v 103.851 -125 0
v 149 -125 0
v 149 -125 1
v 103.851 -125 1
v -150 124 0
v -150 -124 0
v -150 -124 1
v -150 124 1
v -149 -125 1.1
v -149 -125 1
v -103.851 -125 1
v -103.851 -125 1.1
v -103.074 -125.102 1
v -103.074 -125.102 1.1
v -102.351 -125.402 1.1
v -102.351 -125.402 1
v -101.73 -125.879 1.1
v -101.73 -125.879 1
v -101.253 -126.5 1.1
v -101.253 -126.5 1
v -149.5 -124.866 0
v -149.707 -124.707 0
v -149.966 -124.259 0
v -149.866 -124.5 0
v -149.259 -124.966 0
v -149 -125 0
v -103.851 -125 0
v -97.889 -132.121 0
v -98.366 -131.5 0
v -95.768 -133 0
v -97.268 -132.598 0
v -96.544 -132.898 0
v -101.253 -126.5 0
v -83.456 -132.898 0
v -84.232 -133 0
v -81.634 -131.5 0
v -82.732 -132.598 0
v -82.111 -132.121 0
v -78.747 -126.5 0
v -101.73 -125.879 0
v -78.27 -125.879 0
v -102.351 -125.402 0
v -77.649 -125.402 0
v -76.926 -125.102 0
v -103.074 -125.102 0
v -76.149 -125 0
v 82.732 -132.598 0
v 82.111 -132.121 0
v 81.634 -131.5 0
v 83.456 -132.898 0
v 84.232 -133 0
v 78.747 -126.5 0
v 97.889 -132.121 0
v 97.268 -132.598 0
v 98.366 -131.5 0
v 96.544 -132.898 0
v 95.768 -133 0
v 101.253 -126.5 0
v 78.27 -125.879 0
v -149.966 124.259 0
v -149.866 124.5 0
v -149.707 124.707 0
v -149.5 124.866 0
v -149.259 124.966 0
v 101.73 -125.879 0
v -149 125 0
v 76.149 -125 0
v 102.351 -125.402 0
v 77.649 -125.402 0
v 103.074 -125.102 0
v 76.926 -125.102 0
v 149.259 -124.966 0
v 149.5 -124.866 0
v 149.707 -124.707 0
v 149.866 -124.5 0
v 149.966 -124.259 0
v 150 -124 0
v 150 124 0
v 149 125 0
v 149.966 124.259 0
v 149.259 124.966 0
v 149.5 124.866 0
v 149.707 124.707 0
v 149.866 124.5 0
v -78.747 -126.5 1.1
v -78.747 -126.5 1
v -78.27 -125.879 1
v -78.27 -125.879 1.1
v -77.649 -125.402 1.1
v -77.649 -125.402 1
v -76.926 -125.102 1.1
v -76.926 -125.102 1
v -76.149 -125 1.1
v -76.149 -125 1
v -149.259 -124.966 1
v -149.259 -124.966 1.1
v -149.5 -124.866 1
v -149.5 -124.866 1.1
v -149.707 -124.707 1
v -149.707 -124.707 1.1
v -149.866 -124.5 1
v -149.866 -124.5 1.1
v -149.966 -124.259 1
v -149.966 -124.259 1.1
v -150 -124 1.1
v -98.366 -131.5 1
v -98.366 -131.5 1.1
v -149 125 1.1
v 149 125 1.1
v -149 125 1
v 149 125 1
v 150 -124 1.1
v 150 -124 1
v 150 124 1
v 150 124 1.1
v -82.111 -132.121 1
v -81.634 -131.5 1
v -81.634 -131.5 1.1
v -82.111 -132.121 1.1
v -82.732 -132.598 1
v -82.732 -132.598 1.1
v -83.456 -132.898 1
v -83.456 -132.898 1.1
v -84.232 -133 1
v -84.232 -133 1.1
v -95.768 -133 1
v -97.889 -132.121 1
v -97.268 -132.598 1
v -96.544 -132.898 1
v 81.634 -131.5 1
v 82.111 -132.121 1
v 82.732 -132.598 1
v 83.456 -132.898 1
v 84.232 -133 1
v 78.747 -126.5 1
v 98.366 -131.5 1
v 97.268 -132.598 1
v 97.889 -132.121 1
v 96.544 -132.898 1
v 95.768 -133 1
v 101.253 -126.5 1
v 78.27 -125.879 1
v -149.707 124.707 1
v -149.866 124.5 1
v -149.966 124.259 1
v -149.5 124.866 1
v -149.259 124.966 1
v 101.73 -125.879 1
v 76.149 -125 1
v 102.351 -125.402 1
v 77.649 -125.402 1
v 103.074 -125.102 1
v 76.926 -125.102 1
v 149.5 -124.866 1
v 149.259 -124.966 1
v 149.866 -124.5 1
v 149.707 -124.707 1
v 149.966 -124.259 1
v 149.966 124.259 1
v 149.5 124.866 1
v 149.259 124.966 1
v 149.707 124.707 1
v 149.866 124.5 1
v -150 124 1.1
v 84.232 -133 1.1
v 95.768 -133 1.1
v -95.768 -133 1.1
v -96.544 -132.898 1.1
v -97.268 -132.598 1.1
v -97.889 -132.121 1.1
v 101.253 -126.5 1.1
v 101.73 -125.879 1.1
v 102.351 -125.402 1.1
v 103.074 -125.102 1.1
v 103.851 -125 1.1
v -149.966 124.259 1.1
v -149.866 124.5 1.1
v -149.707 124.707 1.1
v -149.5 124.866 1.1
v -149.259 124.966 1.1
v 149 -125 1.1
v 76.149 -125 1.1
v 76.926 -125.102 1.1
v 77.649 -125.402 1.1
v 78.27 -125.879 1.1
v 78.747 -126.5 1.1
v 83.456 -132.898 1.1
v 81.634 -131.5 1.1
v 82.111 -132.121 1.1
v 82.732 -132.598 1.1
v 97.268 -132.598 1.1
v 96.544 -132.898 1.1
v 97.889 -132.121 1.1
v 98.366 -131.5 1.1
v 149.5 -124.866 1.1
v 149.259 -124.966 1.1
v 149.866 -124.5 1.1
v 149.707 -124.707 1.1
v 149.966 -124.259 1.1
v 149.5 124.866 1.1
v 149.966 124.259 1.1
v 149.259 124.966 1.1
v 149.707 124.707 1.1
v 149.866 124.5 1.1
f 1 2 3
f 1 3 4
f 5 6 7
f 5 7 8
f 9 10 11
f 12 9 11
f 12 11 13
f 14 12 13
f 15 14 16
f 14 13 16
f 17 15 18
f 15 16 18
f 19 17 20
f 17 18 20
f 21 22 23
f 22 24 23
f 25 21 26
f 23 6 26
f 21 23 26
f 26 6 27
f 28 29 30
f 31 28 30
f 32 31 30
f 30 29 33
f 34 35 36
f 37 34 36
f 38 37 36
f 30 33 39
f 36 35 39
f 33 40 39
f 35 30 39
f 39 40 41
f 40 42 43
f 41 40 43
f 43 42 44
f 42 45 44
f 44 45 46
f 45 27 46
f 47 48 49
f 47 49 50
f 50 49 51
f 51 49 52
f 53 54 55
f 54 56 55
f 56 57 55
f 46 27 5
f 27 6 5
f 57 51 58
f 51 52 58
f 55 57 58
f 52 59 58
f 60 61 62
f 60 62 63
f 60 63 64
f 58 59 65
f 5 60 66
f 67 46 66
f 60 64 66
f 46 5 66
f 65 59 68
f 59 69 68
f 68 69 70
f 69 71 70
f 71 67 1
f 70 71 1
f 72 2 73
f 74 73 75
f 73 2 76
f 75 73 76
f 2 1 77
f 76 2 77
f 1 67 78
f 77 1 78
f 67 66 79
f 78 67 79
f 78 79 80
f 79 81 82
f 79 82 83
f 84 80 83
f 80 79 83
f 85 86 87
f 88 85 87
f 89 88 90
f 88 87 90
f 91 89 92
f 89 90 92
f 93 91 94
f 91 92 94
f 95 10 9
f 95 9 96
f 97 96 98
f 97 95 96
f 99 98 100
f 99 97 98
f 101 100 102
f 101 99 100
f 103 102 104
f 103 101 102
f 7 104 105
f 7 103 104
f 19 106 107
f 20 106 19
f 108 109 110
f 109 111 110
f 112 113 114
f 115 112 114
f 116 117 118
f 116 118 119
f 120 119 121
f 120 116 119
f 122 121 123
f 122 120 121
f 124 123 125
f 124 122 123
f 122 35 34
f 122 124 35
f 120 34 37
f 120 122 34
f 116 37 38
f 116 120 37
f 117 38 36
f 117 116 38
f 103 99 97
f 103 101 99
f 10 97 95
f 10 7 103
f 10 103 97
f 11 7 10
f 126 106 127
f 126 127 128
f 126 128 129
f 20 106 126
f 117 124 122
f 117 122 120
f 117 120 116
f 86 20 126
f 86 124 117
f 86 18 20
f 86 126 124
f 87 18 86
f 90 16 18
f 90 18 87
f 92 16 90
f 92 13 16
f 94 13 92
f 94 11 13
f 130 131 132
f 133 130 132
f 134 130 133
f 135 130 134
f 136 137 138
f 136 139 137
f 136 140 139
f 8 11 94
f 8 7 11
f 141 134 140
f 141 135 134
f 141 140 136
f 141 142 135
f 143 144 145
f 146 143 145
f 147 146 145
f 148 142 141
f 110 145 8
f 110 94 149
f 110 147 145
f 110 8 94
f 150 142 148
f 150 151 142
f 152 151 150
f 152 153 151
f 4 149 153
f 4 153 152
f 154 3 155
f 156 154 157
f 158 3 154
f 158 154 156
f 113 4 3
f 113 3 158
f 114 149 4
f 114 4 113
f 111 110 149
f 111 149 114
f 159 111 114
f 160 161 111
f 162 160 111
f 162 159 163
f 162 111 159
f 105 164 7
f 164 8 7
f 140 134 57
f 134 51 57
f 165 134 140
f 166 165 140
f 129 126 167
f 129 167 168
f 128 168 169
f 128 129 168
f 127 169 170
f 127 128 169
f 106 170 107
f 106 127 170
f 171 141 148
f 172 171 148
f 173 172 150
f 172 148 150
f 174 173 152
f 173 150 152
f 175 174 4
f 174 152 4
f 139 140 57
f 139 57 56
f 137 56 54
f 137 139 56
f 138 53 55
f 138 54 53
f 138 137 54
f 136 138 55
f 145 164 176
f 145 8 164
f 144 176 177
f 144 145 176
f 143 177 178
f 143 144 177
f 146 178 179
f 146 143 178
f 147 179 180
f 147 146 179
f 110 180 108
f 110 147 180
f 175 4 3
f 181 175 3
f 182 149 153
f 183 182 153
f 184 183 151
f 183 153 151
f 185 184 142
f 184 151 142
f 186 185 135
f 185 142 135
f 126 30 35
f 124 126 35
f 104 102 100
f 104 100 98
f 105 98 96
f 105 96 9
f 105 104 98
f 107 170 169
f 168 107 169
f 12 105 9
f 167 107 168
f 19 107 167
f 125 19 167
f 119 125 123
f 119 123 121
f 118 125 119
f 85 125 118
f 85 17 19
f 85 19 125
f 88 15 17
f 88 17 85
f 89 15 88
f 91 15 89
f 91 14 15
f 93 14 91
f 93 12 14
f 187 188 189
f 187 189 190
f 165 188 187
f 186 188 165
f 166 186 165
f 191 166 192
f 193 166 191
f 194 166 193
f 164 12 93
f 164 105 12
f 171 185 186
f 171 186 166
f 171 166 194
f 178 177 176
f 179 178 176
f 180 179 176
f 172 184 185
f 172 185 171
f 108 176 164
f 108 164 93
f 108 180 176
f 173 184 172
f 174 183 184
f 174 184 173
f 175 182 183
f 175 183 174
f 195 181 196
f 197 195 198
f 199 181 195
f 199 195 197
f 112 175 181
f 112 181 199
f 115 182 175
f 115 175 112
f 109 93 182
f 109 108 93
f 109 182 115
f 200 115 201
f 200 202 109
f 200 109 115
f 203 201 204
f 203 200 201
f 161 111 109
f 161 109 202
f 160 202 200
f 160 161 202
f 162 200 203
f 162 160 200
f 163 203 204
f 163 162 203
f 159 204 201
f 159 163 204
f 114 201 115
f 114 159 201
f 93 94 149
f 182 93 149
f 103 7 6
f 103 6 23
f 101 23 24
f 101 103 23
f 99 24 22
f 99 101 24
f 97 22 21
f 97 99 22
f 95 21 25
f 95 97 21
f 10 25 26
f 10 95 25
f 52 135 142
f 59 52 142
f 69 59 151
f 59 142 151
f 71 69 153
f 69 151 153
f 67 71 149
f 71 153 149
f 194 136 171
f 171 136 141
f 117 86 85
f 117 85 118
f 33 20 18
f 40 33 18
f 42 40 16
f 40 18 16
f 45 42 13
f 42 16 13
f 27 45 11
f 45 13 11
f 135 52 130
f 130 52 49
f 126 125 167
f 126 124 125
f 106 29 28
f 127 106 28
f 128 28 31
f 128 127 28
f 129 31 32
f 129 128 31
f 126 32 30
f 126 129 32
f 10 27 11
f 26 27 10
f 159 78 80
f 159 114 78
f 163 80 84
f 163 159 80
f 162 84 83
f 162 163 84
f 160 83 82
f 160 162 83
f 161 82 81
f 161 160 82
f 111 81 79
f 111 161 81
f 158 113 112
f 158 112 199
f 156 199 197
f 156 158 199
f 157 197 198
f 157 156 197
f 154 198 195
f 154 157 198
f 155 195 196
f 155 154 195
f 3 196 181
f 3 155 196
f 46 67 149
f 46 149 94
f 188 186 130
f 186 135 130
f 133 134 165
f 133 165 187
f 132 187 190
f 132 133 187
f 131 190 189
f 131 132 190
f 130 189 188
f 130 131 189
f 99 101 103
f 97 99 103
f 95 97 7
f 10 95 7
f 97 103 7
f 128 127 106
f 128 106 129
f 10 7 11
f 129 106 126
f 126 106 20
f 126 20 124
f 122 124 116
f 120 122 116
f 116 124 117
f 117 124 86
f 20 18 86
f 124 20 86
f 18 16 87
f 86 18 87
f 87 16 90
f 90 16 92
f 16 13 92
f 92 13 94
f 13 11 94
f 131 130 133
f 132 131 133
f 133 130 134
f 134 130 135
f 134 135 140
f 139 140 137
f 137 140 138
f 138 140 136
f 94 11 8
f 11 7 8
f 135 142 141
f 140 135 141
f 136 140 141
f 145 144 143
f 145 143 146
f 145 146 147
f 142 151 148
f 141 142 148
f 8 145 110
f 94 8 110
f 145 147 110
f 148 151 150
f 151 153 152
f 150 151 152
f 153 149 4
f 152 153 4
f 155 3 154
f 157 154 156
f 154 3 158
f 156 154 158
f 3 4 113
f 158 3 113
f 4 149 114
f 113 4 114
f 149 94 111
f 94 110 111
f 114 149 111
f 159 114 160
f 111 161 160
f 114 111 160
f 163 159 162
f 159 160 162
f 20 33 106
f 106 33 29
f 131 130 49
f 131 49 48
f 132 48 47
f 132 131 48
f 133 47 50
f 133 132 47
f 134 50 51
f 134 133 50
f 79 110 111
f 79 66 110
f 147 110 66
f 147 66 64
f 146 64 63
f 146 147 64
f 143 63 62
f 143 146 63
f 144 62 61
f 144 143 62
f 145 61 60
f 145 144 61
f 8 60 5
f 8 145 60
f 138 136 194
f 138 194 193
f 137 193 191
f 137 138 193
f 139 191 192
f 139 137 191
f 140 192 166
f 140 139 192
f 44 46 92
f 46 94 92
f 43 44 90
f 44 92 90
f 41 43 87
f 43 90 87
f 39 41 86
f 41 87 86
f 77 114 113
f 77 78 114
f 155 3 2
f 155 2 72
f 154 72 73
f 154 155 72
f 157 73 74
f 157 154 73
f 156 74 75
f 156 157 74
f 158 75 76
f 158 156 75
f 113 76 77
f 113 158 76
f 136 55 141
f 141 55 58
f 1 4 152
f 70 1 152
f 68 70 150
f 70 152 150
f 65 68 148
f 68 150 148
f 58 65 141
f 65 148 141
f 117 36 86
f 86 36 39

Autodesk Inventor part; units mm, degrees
ref_plane "YZ Plane" through (0, 0, 0) normal (1, 0, 0) x (0, 1, 0)
ref_plane "XZ Plane" through (0, 0, 0) normal (0, 1, 0) x (-1, 0, 0)
ref_plane "XY Plane" through (0, 0, 0) normal (0, 0, 1) x (1, 0, 0)
sketch "Sketch1" plane through (0, 0, 0) normal (0, 0, 1) x (1, 0, 0)
  line L0 (150, -125) -> (-150, -125)
  line L1 (-150, -125) -> (-150, 125)
  line L2 (-150, 125) -> (150, 125)
  line L3 (150, 125) -> (150, -125)
  line L4 (150, -125) -> (-150, 125) construction
  line L5 (-150, -125) -> (150, 125) construction
  point P0 (0, 0)
  dimension "d0" = 300
  dimension "d1" = 250
extrude "Extrusion1" add sketch "Sketch1" along normal blind 1
fillet "Fillet1" radius 1 4 edges at (-150, 125, 0.5) (-150, -125, 0.5) (150, -125, 0.5) (150, 125, 0.5)
sketch "Sketch3" plane through (0, 0, 0) normal (0, 0, -1) x (-1, 0, 0)
  line L0 (149, -125) -> (-149, -125) projected
  line L1 (102.1188, -125) -> (97.5, -133)
  line L2 (97.5, -133) -> (82.5, -133)
  line L3 (82.5, -133) -> (77.8812, -125)
  point P0 (0, 0)
  point P1 (90, -133)
  dimension "d7" = 60
  dimension "d8" = 60
  dimension "d9" = 8
  dimension "d10" = 15
  dimension "d11" = 90
extrude "Extrusion3" add sketch "Sketch3" against normal up to surface (1 mm away)
mirror "Mirror1" about plane through (0, 0, 0) normal (1, 0, 0) of "Extrusion3"
fillet "Fillet2" radius 3 8 edges at (-77.8812, -125, 0.5) (-82.5, -133, 0.5) (-102.1188, -125, 0.5) (-97.5, -133, 0.5) (77.8812, -125, 0.5) (82.5, -133, 0.5) (102.1188, -125, 0.5) (97.5, -133, 0.5)
sketch "Sketch2" plane through (0, 0, 1) normal (0, 0, 1) x (1, 0, 0)
  arc A0 (150, 124) -> (149, 125) centre (149, 124) ccw projected
  line L0 (149, 125) -> (-149, 125) projected
  arc A1 (-149, 125) -> (-150, 124) centre (-149, 124) ccw projected
  line L1 (-150, 124) -> (-150, -124) projected
  arc A2 (-150, -124) -> (-149, -125) centre (-149, -124) ccw projected
  line L2 (-149, -125) -> (-103.8509, -125) projected
  arc A3 (149, -125) -> (150, -124) centre (149, -124) ccw projected
  line L3 (150, -124) -> (150, 124) projected
  arc A4 (95.7679, -133) -> (98.366, -131.5) centre (95.7679, -130) ccw projected
  line L4 (98.366, -131.5) -> (101.2528, -126.5) projected
  arc A5 (103.8509, -125) -> (101.2528, -126.5) centre (103.8509, -128) ccw projected
  line L5 (103.8509, -125) -> (149, -125) projected
  arc A6 (-101.2528, -126.5) -> (-103.8509, -125) centre (-103.8509, -128) ccw projected
  line L6 (-98.366, -131.5) -> (-101.2528, -126.5) projected
  arc A7 (-98.366, -131.5) -> (-95.7679, -133) centre (-95.7679, -130) ccw projected
  line L7 (-84.2321, -133) -> (-95.7679, -133) projected
  arc A8 (-84.2321, -133) -> (-81.634, -131.5) centre (-84.2321, -130) ccw projected
  line L8 (-78.7472, -126.5) -> (-81.634, -131.5) projected
  arc A9 (-76.1491, -125) -> (-78.7472, -126.5) centre (-76.1491, -128) ccw projected
  line L9 (-76.1491, -125) -> (76.1491, -125) projected
  arc A10 (78.7472, -126.5) -> (76.1491, -125) centre (76.1491, -128) ccw projected
  line L10 (78.7472, -126.5) -> (81.634, -131.5) projected
  arc A11 (81.634, -131.5) -> (84.2321, -133) centre (84.2321, -130) ccw projected
  line L11 (84.2321, -133) -> (95.7679, -133) projected
  point P0 (0, 0)
extrude "Extrusion2" add sketch "Sketch2" along normal blind 0.1 separate body
equation "\"d8\" = d7"
properties part number "PEI Bed Surface" material "Steel, Alloy"
